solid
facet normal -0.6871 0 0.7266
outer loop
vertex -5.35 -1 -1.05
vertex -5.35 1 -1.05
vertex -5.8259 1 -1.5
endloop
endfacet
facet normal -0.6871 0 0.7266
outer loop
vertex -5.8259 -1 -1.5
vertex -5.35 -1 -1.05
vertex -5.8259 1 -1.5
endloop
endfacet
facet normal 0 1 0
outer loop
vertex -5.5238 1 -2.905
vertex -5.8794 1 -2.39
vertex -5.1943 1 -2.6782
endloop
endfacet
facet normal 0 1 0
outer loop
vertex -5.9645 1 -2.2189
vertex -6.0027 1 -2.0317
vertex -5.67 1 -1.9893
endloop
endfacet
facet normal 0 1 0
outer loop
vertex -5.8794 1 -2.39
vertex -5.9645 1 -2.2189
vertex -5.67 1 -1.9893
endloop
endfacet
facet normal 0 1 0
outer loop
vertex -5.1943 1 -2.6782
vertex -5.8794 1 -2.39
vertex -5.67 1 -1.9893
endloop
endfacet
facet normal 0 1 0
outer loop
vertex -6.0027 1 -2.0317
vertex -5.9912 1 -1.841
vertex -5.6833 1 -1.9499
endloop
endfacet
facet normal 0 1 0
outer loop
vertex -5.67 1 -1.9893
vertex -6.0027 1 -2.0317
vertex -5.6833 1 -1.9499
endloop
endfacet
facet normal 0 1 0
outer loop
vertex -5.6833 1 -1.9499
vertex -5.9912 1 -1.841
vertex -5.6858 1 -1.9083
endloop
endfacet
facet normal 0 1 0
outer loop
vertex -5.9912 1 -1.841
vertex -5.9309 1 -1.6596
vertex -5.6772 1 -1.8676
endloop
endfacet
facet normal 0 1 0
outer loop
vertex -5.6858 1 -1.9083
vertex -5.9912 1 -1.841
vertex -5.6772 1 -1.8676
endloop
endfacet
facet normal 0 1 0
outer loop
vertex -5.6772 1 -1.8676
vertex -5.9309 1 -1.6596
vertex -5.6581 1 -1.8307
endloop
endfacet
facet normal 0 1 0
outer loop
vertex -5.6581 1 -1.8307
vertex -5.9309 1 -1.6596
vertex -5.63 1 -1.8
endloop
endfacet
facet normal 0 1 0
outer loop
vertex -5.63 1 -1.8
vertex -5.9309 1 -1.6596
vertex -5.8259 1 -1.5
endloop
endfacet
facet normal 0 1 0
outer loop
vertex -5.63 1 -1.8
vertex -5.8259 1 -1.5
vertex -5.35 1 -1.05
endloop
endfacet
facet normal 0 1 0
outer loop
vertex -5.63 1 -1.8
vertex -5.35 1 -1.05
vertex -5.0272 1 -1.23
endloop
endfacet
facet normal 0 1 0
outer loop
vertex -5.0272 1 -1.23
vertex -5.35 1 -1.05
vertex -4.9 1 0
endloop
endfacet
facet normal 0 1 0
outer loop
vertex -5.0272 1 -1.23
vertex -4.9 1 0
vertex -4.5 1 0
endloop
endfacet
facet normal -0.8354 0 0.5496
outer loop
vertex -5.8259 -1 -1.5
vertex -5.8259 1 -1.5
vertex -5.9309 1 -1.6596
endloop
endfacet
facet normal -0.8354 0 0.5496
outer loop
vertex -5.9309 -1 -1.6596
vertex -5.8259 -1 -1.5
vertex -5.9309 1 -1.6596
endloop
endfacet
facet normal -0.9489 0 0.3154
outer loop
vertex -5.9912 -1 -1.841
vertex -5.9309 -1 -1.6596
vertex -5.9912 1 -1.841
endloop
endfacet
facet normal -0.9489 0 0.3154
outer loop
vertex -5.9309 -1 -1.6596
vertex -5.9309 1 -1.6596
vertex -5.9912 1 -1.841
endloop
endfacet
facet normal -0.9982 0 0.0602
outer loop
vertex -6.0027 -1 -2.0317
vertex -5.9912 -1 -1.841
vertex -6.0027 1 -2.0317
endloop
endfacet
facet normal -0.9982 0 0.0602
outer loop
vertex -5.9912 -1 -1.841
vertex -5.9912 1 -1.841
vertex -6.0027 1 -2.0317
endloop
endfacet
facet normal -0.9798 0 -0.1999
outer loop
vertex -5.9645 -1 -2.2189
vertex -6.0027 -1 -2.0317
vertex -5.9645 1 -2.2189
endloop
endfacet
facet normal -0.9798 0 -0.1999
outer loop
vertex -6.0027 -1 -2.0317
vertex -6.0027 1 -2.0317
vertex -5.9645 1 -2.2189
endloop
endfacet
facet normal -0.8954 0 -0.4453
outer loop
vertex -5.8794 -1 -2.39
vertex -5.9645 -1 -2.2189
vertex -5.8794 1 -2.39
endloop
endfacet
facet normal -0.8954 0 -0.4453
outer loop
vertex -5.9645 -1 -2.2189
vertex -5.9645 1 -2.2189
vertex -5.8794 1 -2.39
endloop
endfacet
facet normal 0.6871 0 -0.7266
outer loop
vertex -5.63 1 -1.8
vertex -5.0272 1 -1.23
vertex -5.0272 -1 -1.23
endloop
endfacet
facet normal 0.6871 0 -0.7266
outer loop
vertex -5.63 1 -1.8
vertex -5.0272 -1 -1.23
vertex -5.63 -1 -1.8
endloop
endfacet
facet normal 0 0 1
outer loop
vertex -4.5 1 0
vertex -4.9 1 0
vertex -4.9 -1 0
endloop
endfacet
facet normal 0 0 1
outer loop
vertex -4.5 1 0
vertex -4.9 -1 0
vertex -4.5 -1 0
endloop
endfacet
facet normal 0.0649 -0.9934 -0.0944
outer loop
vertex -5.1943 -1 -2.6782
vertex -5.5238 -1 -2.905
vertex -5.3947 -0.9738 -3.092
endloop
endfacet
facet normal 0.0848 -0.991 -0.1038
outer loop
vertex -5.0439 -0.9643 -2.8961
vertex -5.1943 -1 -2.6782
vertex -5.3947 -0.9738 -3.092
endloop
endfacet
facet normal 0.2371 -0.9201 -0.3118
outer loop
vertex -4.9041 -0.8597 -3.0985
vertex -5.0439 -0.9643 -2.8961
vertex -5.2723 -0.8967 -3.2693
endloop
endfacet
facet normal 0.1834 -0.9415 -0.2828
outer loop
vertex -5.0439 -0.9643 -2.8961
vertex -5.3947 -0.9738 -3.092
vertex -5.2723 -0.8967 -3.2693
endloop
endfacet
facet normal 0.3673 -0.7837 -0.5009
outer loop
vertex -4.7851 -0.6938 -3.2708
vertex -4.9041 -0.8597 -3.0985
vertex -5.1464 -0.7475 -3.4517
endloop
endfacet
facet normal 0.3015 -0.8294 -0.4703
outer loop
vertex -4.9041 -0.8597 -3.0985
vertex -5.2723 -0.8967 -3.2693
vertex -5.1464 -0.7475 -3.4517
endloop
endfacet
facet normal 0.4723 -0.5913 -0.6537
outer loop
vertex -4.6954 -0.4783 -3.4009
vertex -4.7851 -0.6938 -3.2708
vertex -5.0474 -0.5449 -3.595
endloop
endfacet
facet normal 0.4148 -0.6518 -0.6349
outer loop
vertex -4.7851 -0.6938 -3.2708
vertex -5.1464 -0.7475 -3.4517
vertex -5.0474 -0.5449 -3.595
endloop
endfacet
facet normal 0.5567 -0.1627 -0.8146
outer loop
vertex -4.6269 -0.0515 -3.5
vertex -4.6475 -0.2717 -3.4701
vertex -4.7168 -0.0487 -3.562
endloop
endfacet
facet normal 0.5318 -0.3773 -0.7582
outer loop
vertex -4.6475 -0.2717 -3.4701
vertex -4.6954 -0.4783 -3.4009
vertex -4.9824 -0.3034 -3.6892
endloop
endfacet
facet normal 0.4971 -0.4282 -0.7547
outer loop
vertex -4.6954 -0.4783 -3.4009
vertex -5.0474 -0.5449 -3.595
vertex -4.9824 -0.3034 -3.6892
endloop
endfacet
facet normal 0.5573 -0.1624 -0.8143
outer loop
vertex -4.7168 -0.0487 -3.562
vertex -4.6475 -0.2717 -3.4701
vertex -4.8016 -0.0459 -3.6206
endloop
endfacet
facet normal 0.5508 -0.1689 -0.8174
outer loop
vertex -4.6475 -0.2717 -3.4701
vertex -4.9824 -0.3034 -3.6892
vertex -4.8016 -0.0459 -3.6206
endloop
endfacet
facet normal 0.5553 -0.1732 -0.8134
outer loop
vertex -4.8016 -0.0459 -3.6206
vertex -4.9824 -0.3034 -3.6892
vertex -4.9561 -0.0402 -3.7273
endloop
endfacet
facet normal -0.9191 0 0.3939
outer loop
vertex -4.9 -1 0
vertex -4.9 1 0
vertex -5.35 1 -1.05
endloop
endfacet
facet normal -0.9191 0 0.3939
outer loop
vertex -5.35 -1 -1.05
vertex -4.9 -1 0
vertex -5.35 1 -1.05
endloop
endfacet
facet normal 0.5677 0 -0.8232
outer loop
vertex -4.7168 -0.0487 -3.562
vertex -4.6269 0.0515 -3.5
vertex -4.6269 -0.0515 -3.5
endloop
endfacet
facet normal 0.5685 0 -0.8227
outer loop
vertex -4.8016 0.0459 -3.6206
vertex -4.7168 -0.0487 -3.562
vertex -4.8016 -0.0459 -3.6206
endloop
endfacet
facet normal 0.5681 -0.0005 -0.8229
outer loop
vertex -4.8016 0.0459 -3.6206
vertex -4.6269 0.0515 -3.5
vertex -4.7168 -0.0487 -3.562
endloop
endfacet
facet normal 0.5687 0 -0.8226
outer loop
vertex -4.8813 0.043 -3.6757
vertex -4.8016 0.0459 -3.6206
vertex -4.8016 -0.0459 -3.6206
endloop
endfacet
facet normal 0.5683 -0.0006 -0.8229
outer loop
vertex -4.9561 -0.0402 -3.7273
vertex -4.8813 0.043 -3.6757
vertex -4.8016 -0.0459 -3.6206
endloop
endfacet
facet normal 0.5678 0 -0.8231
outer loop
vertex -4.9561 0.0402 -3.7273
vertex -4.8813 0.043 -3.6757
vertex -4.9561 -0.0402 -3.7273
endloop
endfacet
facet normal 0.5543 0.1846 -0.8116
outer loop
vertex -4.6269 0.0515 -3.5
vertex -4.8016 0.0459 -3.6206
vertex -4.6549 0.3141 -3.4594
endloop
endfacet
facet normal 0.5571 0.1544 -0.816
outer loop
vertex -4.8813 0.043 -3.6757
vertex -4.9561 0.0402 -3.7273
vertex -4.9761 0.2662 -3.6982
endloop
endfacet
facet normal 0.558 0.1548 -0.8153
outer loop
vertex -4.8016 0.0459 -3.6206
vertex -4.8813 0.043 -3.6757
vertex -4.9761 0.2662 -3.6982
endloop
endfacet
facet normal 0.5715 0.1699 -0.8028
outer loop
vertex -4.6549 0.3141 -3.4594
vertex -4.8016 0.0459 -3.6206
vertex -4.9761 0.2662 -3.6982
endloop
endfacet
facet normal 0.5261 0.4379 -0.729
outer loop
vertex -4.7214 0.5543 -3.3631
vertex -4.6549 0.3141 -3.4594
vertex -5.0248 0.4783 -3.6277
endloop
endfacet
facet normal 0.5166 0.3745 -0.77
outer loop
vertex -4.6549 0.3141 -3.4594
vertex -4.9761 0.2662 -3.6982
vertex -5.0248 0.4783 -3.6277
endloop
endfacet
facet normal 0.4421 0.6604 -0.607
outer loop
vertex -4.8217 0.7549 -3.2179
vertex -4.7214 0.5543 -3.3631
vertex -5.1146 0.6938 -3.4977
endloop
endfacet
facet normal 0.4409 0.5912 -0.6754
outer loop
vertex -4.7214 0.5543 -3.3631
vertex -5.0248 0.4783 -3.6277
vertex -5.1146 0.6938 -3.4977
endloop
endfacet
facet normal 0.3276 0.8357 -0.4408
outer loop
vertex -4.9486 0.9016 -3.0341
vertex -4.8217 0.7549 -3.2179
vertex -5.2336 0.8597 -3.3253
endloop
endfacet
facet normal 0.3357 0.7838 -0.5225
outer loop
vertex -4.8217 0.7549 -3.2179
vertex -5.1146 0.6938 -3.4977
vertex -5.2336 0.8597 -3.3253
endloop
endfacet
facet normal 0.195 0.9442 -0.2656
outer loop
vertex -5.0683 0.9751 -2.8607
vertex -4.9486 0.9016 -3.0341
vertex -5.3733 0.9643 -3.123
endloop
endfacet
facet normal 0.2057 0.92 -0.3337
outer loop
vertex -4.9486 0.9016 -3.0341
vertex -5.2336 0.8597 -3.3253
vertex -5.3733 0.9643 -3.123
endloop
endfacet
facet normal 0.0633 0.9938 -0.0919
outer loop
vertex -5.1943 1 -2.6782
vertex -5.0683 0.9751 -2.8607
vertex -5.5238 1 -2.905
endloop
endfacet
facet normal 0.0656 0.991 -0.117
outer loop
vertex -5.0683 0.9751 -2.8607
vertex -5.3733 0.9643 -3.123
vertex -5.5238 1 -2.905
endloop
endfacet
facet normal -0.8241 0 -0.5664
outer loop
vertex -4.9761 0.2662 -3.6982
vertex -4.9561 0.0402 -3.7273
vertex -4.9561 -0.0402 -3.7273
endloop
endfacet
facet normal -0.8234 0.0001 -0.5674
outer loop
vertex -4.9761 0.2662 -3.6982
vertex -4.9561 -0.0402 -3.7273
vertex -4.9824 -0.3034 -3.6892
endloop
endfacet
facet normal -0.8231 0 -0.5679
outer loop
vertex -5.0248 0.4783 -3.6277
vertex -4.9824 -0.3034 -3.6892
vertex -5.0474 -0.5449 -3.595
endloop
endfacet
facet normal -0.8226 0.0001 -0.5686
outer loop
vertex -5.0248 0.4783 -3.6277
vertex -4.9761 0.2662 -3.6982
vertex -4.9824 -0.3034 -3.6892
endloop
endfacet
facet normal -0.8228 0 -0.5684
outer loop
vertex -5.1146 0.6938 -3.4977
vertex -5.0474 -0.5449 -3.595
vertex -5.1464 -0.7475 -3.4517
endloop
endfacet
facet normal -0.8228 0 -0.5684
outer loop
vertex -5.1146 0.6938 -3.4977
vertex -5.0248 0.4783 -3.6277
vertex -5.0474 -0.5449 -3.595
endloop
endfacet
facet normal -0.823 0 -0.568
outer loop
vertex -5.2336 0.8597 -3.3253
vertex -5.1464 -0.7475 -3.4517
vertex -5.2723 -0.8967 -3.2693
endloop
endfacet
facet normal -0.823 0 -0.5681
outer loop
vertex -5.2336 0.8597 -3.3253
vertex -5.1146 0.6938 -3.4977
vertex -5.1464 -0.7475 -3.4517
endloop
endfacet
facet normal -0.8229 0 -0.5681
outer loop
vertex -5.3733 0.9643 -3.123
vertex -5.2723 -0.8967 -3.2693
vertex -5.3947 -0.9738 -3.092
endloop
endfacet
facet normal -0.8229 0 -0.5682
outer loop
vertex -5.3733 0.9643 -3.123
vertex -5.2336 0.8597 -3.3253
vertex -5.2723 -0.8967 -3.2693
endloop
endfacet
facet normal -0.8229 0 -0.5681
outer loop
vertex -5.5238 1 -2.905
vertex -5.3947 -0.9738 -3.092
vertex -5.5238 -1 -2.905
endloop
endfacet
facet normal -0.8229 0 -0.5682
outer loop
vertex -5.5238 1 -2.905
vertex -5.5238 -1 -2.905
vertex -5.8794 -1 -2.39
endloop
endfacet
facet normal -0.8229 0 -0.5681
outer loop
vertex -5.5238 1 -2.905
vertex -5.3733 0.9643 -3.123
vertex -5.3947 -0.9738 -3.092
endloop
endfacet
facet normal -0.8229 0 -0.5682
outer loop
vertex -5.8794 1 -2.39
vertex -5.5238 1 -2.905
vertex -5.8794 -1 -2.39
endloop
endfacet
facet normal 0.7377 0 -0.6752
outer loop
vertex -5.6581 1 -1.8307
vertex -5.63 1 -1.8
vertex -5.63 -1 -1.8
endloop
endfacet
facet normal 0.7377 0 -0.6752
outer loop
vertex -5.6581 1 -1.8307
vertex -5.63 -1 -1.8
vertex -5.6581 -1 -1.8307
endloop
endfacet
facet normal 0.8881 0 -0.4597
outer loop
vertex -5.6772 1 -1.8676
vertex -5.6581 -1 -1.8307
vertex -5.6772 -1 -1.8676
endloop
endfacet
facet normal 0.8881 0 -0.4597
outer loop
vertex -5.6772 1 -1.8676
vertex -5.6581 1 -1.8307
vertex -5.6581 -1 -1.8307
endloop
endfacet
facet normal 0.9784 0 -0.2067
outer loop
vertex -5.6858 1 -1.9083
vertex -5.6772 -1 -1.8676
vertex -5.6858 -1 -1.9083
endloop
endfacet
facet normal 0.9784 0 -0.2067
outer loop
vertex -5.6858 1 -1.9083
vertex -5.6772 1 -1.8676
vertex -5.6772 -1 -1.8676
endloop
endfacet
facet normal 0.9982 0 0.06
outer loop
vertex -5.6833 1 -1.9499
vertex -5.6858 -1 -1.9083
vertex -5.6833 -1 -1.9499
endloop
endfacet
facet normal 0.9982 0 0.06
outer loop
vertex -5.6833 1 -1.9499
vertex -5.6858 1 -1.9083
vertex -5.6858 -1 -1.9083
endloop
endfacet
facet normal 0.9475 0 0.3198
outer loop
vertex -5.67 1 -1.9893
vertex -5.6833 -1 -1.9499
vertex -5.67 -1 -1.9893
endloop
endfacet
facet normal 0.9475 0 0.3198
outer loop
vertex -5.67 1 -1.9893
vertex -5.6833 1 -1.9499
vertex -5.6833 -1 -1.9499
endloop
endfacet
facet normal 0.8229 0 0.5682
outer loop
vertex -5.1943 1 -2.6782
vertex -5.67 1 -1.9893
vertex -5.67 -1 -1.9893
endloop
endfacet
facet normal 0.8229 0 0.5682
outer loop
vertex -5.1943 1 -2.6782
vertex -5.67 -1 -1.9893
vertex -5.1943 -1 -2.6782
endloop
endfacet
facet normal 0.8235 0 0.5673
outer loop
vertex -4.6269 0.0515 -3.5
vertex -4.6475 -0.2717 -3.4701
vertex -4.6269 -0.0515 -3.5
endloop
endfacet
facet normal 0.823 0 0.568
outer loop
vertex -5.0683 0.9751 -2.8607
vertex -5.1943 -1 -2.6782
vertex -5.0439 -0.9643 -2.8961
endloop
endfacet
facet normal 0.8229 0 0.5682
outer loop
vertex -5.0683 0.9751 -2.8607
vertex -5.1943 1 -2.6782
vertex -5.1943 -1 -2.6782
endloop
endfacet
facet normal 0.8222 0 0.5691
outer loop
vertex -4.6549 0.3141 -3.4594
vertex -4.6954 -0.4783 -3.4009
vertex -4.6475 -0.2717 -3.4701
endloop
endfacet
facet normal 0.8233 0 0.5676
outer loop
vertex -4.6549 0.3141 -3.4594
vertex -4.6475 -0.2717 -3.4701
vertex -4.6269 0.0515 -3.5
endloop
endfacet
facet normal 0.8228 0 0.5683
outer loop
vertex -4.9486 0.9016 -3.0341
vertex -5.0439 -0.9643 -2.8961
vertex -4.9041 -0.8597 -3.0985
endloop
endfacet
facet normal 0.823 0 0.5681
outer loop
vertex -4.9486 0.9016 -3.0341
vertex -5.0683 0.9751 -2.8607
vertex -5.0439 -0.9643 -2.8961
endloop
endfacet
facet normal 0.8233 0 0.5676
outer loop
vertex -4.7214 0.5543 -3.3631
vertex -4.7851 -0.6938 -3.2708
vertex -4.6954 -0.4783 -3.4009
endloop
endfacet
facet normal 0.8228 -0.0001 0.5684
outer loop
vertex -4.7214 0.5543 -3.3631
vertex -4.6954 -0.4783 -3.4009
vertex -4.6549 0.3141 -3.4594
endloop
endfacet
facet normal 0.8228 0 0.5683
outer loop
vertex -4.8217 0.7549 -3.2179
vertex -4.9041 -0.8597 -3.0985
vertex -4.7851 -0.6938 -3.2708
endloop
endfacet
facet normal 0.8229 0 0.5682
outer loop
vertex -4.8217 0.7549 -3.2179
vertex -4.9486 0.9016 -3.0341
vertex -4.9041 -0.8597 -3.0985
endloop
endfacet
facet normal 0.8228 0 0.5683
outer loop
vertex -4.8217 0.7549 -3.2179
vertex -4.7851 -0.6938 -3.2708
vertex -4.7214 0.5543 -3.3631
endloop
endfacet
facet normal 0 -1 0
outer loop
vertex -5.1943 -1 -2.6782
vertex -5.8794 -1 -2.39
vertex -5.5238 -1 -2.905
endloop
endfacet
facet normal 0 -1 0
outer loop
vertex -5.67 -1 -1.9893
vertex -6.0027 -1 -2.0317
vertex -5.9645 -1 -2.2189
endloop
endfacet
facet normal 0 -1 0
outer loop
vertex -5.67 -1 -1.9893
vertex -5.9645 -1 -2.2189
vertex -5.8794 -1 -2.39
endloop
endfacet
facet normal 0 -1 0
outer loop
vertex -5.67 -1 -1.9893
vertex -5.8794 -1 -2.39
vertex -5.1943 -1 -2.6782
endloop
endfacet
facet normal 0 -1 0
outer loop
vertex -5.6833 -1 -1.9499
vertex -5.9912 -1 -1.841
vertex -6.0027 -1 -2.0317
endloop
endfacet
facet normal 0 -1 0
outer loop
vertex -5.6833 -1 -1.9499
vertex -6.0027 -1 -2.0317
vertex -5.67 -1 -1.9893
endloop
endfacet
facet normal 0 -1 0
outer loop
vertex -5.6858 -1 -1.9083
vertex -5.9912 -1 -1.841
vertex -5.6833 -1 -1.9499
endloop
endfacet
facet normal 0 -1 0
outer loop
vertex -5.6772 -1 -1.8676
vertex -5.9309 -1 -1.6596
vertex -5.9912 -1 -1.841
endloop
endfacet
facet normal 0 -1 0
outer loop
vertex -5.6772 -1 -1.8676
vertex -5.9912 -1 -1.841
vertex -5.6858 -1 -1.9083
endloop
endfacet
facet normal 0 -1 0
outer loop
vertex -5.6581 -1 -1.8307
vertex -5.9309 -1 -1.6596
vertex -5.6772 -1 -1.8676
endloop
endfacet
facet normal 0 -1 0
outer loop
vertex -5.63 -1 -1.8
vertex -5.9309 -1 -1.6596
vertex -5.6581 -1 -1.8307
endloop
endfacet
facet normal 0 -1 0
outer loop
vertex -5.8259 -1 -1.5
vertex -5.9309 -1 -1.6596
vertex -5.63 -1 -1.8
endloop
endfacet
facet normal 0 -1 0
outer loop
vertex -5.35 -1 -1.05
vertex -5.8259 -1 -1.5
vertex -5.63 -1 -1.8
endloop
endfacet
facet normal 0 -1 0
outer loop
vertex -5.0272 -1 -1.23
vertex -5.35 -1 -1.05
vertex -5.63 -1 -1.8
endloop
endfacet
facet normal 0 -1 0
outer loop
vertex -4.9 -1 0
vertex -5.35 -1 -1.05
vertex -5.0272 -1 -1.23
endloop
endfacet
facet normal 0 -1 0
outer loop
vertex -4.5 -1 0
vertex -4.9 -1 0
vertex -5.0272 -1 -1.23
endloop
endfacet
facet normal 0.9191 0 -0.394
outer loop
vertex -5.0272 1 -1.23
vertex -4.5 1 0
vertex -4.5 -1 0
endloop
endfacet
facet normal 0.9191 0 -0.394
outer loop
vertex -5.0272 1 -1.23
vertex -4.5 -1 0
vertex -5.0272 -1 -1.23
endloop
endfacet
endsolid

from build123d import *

# Parameters (mm, degrees)
PAD007_DEPTH            = 0.45
BODY007_PLACEMENT_ANGLE = 325.45
PAD005_DEPTH            = 2


with BuildPart() as body007:
    # Sketch009 → Pad007 (new body)
    with BuildSketch(Plane.YZ):
        with BuildLine():
            ThreePointArc((-1, 1.01), (0, 0.01), (1, 1.010001))
            Line((1, 0), (1, 1.010001))
            Line((-1, 0), (1, 0))
            Line((-1, 1.01), (-1, 0))
        make_face()
    extrude(amount=PAD007_DEPTH)


with BuildPart() as body007_1:
    # Body007 placement: moved
    add(body007.part.moved(Location((-4.97, 0, -3.75))).rotate(Axis((-4.97, 0, -3.75), (0, 1, 0)), BODY007_PLACEMENT_ANGLE))


with BuildPart() as cut004:
    # Sketch007 → Pad005 (new body)
    with BuildSketch(Plane.XZ):
        with BuildLine():
            Line((-4.9, 0), (-5.350031, -1.05))
            Line((-5.350031, -1.05), (-5.825942, -1.5))
            ThreePointArc((-5.825942, -1.5), (-6.003166, -1.93596), (-5.879403, -2.39))
            Line((-4.956057, -3.727275), (-5.879403, -2.39))
            Line((-4.626897, -3.5), (-4.956057, -3.727275))
            Line((-5.67, -1.989282), (-4.626897, -3.5))
            ThreePointArc((-5.63, -1.8), (-5.68283, -1.887703), (-5.67, -1.989282))
            Line((-5.027179, -1.23), (-5.63, -1.8))
            Line((-4.5, 0), (-5.027179, -1.23))
            Line((-4.9, 0), (-4.5, 0))
        make_face()
    extrude(amount=PAD005_DEPTH)


with BuildPart() as cut004_1:
    # Body005 placement: moved
    add(cut004.part.moved(Location((0, 1, 0))))

    # Cut004: cut Body007
    add(body007_1.part, mode=Mode.SUBTRACT)


solid = cut004_1.part
